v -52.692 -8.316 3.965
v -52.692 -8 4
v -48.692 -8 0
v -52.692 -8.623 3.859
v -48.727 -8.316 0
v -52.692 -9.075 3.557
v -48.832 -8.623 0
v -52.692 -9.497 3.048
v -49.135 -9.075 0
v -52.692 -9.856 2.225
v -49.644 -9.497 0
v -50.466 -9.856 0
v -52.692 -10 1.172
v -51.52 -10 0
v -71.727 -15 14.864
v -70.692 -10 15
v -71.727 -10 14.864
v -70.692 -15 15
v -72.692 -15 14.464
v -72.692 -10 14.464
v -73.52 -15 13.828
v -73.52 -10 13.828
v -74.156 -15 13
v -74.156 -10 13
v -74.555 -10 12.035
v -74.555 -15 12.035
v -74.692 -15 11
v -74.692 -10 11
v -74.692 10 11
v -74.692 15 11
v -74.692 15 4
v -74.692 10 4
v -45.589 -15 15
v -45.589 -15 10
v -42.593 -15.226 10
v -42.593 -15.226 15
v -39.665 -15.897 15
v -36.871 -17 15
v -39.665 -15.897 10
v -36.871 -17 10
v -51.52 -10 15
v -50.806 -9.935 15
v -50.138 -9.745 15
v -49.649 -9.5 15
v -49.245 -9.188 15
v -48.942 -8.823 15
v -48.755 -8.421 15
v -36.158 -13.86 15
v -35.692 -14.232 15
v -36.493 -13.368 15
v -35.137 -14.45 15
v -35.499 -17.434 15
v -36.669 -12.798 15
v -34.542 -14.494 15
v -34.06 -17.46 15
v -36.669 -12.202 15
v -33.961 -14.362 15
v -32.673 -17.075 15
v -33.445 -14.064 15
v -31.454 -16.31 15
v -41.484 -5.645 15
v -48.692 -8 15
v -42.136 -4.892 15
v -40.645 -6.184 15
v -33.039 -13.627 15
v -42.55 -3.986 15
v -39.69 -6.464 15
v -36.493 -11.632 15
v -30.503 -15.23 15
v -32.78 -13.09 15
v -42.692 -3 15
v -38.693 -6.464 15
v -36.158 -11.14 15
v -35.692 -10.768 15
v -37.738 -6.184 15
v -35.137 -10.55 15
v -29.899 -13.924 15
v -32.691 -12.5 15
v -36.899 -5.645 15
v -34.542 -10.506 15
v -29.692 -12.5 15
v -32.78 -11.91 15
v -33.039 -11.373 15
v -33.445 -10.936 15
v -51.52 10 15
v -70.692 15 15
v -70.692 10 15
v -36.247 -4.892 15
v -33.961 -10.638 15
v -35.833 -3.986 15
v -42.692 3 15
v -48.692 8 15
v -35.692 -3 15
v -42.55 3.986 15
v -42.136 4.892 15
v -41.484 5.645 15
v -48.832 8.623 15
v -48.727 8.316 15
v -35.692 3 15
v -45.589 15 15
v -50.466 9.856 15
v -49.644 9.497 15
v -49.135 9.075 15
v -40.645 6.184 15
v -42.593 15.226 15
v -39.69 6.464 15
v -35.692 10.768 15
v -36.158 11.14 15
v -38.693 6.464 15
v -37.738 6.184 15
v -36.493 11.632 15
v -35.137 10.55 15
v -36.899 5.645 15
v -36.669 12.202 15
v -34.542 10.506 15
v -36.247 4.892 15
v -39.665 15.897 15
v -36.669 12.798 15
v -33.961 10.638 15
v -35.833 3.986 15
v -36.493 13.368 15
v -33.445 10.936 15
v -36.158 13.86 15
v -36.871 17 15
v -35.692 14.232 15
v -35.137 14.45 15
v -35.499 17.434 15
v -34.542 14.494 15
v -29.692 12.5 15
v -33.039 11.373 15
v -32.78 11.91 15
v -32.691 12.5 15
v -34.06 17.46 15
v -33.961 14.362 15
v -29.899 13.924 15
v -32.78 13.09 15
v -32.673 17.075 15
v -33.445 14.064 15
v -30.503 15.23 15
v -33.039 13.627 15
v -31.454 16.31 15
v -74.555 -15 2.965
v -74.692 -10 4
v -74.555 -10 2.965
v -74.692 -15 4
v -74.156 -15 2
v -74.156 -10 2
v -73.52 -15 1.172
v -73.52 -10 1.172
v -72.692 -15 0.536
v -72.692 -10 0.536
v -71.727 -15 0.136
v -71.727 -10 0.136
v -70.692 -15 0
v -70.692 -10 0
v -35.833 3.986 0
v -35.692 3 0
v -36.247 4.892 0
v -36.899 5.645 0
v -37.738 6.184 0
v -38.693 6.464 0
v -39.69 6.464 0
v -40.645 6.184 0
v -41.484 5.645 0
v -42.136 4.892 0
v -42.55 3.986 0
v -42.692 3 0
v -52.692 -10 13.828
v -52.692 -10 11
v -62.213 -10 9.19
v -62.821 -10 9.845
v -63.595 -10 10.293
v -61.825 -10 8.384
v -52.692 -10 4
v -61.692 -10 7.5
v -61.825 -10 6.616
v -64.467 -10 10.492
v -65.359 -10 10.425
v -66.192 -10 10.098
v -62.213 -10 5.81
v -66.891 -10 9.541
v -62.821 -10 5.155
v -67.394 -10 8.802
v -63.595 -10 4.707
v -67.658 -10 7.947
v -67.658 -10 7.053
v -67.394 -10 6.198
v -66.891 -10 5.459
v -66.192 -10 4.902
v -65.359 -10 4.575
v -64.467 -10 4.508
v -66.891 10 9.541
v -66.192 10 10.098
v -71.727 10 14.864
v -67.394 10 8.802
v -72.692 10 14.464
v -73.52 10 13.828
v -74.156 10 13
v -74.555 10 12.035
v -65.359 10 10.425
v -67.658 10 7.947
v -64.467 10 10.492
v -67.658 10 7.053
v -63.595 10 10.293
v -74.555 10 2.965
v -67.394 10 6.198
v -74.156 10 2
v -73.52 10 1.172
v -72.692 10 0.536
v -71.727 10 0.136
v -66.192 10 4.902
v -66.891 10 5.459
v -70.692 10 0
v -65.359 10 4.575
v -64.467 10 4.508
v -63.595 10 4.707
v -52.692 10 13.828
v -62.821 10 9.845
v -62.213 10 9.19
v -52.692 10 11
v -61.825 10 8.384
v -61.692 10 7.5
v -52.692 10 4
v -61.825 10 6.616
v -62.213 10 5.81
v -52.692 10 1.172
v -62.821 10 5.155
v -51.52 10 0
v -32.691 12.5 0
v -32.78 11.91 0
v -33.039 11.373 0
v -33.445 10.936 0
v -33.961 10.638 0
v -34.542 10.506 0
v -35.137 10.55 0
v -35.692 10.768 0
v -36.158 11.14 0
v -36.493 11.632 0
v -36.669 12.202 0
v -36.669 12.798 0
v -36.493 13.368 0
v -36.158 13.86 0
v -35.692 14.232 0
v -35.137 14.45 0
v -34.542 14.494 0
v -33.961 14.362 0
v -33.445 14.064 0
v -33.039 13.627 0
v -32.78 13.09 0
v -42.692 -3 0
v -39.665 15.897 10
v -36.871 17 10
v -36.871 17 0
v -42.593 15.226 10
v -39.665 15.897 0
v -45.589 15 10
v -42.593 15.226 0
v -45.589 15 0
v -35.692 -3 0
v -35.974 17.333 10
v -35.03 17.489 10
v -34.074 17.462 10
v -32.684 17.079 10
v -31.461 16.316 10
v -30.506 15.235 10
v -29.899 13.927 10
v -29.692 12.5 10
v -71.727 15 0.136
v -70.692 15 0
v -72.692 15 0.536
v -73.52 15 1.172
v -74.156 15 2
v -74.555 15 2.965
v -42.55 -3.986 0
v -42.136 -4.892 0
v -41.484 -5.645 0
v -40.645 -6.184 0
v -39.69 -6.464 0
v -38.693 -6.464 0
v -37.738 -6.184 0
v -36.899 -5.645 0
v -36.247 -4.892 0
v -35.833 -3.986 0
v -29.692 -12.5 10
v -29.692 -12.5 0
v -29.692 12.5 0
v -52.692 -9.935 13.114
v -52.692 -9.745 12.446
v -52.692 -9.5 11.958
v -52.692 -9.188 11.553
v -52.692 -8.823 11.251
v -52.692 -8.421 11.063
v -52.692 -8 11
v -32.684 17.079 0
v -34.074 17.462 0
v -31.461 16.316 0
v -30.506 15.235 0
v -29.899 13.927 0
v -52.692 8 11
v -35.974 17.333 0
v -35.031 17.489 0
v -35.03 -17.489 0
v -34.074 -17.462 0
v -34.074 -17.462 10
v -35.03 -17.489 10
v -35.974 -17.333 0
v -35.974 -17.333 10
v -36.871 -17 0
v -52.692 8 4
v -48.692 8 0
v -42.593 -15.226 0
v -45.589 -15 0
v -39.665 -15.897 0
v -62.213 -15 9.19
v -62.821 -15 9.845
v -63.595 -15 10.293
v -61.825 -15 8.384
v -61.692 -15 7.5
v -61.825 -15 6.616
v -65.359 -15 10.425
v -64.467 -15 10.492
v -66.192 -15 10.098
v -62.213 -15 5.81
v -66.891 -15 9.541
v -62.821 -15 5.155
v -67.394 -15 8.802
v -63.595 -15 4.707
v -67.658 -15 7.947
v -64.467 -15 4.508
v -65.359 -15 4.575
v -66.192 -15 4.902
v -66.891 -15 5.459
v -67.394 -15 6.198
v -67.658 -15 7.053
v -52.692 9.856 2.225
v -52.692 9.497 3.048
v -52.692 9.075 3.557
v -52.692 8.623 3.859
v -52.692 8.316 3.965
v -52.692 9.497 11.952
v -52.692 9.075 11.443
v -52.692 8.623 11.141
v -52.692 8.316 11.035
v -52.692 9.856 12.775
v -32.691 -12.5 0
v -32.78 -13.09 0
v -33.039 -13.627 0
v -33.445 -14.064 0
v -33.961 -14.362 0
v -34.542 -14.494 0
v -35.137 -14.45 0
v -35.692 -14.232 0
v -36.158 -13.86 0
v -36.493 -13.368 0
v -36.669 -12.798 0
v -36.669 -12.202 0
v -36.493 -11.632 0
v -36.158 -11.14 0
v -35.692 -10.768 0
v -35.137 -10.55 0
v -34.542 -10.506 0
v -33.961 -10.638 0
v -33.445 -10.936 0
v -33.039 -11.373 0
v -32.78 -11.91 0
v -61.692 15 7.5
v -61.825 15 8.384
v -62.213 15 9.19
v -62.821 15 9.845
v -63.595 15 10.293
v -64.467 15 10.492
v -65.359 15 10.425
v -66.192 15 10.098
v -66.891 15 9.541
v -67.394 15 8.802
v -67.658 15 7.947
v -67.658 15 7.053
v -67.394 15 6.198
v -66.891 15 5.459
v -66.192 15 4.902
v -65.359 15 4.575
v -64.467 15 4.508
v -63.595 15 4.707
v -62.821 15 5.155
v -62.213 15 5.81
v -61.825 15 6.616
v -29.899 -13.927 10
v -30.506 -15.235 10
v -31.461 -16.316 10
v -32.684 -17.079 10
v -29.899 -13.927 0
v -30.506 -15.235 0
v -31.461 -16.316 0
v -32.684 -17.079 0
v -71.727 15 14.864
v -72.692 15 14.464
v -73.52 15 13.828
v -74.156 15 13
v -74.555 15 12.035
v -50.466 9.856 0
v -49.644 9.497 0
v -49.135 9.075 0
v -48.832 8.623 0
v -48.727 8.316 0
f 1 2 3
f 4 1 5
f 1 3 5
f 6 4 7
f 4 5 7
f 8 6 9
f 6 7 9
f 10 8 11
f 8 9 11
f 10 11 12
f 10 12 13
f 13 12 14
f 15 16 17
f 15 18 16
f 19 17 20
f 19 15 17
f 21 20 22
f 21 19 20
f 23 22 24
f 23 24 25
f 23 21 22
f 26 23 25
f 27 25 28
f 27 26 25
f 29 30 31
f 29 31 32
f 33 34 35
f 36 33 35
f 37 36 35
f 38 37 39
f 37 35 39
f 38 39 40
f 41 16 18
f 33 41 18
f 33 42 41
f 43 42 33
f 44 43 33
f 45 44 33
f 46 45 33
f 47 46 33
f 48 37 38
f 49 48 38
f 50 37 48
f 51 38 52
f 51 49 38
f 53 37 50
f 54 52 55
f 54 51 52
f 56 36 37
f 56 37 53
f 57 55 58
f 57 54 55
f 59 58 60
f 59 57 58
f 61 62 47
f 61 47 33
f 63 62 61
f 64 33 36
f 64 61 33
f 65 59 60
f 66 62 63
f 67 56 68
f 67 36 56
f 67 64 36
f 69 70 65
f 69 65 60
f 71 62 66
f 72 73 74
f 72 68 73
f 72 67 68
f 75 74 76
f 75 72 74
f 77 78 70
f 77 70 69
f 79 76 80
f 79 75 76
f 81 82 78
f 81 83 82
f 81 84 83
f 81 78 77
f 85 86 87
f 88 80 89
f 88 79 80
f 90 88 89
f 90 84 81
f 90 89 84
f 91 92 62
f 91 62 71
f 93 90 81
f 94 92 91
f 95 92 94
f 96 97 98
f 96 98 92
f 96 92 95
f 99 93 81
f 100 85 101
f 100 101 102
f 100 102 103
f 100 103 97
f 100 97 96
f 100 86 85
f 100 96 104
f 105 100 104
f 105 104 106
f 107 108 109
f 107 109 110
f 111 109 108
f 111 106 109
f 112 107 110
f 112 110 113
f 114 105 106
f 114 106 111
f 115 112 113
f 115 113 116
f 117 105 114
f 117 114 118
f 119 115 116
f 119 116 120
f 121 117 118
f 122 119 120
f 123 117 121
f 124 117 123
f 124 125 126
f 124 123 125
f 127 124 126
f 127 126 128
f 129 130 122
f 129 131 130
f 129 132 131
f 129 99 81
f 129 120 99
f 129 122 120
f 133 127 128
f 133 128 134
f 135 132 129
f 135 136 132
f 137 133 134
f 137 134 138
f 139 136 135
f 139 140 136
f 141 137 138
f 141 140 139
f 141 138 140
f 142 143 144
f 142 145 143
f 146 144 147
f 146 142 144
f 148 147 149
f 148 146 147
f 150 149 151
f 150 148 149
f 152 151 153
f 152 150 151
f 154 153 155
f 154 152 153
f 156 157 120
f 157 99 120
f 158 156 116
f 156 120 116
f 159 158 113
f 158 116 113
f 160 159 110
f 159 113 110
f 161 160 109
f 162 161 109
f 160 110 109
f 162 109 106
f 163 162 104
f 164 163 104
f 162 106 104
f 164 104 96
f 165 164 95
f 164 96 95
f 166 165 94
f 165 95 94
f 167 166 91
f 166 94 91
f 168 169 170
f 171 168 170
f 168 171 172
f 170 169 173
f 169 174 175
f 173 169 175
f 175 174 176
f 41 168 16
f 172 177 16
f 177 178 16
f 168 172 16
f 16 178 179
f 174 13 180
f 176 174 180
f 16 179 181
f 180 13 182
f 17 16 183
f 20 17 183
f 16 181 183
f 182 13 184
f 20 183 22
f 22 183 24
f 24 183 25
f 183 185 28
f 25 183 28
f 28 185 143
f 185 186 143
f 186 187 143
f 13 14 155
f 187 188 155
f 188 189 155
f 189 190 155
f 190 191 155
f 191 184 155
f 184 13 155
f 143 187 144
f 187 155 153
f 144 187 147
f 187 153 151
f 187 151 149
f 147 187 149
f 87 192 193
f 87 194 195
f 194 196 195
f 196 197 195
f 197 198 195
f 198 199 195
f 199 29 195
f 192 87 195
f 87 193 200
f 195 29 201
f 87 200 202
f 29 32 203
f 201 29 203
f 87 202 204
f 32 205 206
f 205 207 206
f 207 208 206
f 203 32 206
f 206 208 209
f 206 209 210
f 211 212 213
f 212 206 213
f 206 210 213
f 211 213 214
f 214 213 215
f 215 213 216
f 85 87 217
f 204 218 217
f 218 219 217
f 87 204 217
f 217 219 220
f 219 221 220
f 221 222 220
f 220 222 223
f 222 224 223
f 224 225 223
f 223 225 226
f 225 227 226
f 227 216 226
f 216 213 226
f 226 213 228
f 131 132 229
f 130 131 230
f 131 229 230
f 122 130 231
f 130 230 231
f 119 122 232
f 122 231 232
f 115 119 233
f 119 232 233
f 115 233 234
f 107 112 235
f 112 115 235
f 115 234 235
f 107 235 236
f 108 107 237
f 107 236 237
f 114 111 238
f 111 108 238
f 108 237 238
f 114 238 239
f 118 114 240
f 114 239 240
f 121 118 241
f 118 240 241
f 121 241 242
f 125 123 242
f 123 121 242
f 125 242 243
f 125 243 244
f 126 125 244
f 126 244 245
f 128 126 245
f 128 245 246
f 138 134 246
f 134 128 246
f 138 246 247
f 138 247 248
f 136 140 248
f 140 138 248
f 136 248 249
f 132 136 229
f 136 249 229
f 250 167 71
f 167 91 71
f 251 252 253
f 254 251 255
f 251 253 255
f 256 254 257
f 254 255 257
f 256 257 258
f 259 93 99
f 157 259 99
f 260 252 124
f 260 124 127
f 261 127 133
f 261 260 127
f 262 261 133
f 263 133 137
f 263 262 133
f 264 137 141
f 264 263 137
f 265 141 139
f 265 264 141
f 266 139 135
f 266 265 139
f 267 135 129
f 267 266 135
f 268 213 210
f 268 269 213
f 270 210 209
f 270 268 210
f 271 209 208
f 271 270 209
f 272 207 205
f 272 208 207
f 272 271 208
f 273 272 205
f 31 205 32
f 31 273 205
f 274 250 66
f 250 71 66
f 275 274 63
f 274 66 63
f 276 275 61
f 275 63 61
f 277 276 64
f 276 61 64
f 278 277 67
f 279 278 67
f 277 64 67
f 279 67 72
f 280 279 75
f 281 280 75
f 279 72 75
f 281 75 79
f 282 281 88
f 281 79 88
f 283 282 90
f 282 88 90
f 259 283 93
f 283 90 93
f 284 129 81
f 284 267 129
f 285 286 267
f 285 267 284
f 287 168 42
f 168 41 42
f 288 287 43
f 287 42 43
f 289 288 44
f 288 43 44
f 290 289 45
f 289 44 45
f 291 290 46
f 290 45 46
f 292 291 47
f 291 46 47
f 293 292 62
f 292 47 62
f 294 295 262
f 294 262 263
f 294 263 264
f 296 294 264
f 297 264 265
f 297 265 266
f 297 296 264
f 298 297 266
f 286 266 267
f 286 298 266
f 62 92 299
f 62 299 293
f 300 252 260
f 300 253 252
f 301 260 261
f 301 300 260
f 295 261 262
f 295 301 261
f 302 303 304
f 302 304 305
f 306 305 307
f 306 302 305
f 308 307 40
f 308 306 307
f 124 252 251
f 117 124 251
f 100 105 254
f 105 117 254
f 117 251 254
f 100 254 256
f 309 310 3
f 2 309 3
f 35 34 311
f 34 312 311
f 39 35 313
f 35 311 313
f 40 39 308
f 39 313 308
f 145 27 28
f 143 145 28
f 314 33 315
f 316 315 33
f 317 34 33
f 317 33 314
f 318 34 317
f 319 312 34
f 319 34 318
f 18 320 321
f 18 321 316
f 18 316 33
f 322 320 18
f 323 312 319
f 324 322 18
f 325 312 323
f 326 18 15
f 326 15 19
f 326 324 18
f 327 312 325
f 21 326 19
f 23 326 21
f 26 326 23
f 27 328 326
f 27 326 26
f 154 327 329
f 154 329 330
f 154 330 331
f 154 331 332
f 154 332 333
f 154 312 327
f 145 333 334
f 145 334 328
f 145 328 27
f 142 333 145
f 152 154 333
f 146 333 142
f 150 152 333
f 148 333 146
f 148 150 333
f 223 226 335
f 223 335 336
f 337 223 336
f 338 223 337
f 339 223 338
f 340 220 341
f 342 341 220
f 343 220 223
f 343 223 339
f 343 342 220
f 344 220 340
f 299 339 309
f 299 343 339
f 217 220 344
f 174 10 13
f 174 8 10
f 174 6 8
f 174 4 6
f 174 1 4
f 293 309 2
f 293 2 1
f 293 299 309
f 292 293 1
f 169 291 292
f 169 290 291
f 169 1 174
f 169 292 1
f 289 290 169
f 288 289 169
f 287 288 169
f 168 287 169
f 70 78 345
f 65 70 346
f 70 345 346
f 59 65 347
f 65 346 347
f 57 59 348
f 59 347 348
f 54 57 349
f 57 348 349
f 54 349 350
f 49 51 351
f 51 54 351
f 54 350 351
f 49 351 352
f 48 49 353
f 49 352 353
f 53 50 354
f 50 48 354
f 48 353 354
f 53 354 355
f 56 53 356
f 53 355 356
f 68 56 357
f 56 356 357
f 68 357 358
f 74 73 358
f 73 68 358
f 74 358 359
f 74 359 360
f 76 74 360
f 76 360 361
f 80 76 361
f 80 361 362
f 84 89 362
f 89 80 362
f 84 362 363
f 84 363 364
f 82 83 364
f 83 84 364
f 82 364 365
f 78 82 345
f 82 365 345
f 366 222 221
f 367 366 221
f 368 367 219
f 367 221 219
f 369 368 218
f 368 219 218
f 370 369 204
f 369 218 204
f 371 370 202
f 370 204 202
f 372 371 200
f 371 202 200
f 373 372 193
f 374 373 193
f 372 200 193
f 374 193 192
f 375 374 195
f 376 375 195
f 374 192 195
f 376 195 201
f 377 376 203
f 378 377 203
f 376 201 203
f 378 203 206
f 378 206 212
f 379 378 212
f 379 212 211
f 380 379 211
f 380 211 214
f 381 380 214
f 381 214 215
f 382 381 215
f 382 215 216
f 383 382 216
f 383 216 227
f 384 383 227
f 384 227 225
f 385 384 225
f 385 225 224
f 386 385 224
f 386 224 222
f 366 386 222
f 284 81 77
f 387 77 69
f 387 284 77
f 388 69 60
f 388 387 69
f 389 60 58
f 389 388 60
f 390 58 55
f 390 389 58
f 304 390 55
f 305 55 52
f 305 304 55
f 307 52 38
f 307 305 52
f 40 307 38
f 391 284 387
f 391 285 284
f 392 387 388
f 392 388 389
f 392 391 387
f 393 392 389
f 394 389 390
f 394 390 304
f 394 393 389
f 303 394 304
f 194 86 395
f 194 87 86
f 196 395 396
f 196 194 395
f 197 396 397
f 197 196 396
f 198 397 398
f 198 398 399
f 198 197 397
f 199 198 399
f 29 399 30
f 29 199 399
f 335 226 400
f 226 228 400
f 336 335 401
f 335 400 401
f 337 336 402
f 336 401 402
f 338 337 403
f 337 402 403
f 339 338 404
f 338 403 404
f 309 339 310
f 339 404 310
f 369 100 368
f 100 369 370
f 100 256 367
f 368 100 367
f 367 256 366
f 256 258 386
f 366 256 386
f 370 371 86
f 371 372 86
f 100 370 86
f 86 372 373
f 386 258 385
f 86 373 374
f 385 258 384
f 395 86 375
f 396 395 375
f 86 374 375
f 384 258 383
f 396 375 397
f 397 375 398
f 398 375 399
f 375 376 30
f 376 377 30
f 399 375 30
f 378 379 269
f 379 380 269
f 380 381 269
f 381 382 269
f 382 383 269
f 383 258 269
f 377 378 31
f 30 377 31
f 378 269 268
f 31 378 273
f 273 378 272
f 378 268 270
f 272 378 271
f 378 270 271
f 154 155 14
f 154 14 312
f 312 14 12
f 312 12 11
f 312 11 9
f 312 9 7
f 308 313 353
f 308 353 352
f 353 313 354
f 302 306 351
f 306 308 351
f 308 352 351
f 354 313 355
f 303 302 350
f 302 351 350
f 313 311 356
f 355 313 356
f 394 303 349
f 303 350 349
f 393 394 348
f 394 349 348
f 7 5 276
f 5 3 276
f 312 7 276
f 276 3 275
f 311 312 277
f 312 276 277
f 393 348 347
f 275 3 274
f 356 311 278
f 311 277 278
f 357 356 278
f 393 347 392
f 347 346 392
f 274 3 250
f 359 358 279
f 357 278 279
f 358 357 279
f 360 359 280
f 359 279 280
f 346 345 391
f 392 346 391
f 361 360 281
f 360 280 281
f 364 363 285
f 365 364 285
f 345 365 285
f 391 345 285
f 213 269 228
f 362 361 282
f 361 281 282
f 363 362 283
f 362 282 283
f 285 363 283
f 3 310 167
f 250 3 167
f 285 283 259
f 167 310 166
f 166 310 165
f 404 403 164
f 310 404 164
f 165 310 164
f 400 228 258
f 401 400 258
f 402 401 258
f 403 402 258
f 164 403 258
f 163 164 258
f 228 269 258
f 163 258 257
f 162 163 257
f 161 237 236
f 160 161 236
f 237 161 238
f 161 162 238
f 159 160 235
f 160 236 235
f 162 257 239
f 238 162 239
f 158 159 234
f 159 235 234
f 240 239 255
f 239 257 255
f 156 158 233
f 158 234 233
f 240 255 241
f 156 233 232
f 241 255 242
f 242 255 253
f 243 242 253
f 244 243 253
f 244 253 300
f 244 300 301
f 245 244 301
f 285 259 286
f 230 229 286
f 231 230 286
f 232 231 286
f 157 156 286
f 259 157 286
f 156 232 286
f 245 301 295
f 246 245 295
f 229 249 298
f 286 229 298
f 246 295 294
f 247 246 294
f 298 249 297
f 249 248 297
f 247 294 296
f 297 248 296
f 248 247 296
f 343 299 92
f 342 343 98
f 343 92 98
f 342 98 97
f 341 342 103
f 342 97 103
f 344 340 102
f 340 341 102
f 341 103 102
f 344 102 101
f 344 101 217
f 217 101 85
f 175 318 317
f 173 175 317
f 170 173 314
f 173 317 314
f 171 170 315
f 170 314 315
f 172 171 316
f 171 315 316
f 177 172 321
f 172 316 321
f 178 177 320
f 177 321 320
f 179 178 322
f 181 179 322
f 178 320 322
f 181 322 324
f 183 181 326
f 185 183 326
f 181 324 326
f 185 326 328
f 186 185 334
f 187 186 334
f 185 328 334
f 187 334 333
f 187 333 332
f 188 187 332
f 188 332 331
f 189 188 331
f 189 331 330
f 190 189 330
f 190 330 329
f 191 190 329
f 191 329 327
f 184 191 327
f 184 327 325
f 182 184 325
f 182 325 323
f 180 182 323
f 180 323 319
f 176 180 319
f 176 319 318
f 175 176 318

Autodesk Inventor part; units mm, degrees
ref_plane "YZ Plane" through (0, 0, 0) normal (1, 0, 0) x (0, 1, 0)
ref_plane "XZ Plane" through (0, 0, 0) normal (0, 1, 0) x (-1, 0, 0)
ref_plane "XY Plane" through (0, 0, 0) normal (0, 0, 1) x (1, 0, 0)
sketch "Sketch1" plane through (0, 0, 0) normal (0, 0, 1) x (1, 0, 0)
  circle A0 centre (19.8085, -5.5) radius 1 projected
  circle A1 centre (30.8085, -5.5) radius 1 projected
  circle A2 centre (19.8085, 5.5) radius 1 projected
  circle A3 centre (30.8085, 5.5) radius 1 projected
  circle A4 centre (25.3085, 0) radius 6.65 projected
  line L0 (41.3085, 2) -> (41.3085, -2) projected
  line L1 (35.1065, 2) -> (41.3085, 2) projected
  arc A5 (35.1065, 2) -> (26.5426, 9.9236) centre (25.3085, 0) ccw projected
  line L2 (26.5426, 9.9236) -> (-34.0744, 17.4618) projected
  arc A6 (-34.0744, 17.4618) -> (-39.6915, 12.5) centre (-34.6915, 12.5) ccw projected
  line L3 (-39.6915, 12.5) -> (-39.6915, -12.5) projected
  arc A7 (-39.6915, -12.5) -> (-34.0744, -17.4618) centre (-34.6915, -12.5) ccw projected
  line L4 (-34.0744, -17.4618) -> (26.5426, -9.9236) projected
  arc A8 (26.5426, -9.9236) -> (35.1065, -2) centre (25.3085, 0) ccw projected
  line L5 (41.3085, -2) -> (35.1065, -2) projected
  circle A9 centre (-34.6915, 12.5) radius 2 projected
  circle A10 centre (-34.6915, -12.5) radius 2 projected
  line L6 (-25.1979, 6.2809) -> (9.3489, 1.9847) projected
  arc A11 (9.3489, -1.9847) -> (9.3489, 1.9847) centre (9.1021, 0) ccw projected
  line L7 (9.3489, -1.9847) -> (-25.1979, -6.2809) projected
  arc A12 (-29.6915, -2.3115) -> (-25.1979, -6.2809) centre (-25.6915, -2.3115) ccw projected
  line L8 (-29.6915, -2.3115) -> (-29.6915, 2.3115) projected
  arc A13 (-25.1979, 6.2809) -> (-29.6915, 2.3115) centre (-25.6915, 2.3115) ccw projected
  circle A14 centre (-34.6915, -12.5) radius 5
  circle A15 centre (-34.6915, 12.5) radius 5
  line L9 (-34.6915, -12.5) -> (-34.6915, 12.5)
  line L10 (-34.6915, -12.5) -> (-29.6915, -12.5)
  line L11 (-34.6915, 12.5) -> (-29.6915, 12.5)
  line L12 (-29.6915, 12.5) -> (-29.6915, -12.5)
  line L13 (-34.6915, 0) -> (-64.6915, 0)
  line L14 (-64.6915, -10) -> (-64.6915, 10)
  line L15 (-64.6915, 10) -> (-34.6915, 10)
  line L16 (-34.6915, 10) -> (-34.6915, -10)
  line L17 (-34.6915, -10) -> (-64.6915, -10)
  line L18 (-64.6915, -10) -> (-34.6915, 10) construction
  line L19 (-64.6915, 10) -> (-34.6915, -10) construction
  line L20 (-64.6915, -10) -> (-34.6915, -10)
  line L21 (-34.6915, -10) -> (-34.6915, -15)
  line L22 (-34.6915, -15) -> (-64.6915, -15)
  line L23 (-64.6915, -15) -> (-64.6915, -10)
  line L24 (-64.6915, 10) -> (-34.6915, 10)
  line L25 (-34.6915, 10) -> (-34.6915, 15)
  line L26 (-34.6915, 15) -> (-64.6915, 15)
  line L27 (-64.6915, 15) -> (-64.6915, 10)
  point P0 (0, 0)
  point P1 (-49.6915, 0)
  point P2 (-39.0216, 15)
  point P3 (-39.6915, 10)
  point P4 (-39.6915, -10)
  point P5 (-39.0216, -15)
  dimension "d0" = 10
  dimension "d1" = 10
  dimension "d2" = 30
  dimension "d3" = 20
  dimension "d4" = 30
  dimension "d5" = 30
  dimension "d6" = 5
  dimension "d7" = 30
  dimension "d8" = 5
extrude "Extrusion1" add sketch "Sketch1" along normal blind 10 contours A15 L11 A9 L25 L26 A6 | A7 L22 L21 A10 L10 A14 | L26 L25 A9 L9 L15 A15 A6 | A6 L3 L15 L27 L26 | L12 L8 A14 L9 A15 | A15 L9 A9 L11 | L22 L23 L17 L3 A7 | A7 A14 L17 L9 A10 L21 L22 | L10 A10 L9 A14 | A15 L15 L3 | L9 L13 L3 L15 A15 | A15 L15 L9 | L3 L17 A14 | L9 L17 A14 | A14 L17 L3 L13 L9
thicken "Thicken1" operation add thickness 10 both sides no extend neighbours yes toward (-1, 0, 0) faces at (-64.6915, -11.6667, 3.3333)
thicken "Thicken2" operation add thickness 10 both sides no extend neighbours yes toward (-1, 0, 0) faces at (-64.6915, 13.3333, 3.3333)
sketch "Sketch2" plane through (0, 0, 10) normal (0, 0, 1) x (1, 0, 0)
  line L0 (-39.6915, 10) -> (-39.6915, -10) projected
  line L1 (-39.6915, -10) -> (-74.6915, -10) projected
  line L2 (-74.6915, -10) -> (-74.6915, -15) projected
  line L3 (-74.6915, -15) -> (-39.0216, -15) projected
  arc A0 (-39.0216, -15) -> (-29.6915, -12.5) centre (-34.6915, -12.5) ccw projected
  line L4 (-29.6915, -12.5) -> (-29.6915, 12.5) projected
  arc A1 (-29.6915, 12.5) -> (-39.0216, 15) centre (-34.6915, 12.5) ccw projected
  line L5 (-39.0216, 15) -> (-74.6915, 15) projected
  line L6 (-74.6915, 15) -> (-74.6915, 10) projected
  line L7 (-74.6915, 10) -> (-39.6915, 10) projected
  circle A2 centre (-34.6915, -12.5) radius 2 projected
  circle A3 centre (-34.6915, 12.5) radius 2 projected
  point P0 (0, 0)
extrude "Extrusion2" add sketch "Sketch2" along normal blind 5
sketch "Sketch3" plane through (0, 0, 15) normal (0, 0, 1) x (1, 0, 0)
  line L0 (-39.6915, 10) -> (-39.6915, -10) projected
  line L1 (-39.6915, -10) -> (-74.6915, -10) projected
  line L2 (-74.6915, -10) -> (-74.6915, -15) projected
  line L3 (-74.6915, -15) -> (-39.0216, -15) projected
  arc A0 (-39.0216, -15) -> (-29.6915, -12.5) centre (-34.6915, -12.5) ccw projected
  line L4 (-29.6915, -12.5) -> (-29.6915, 12.5) projected
  arc A1 (-29.6915, 12.5) -> (-39.0216, 15) centre (-34.6915, 12.5) ccw projected
  line L5 (-39.0216, 15) -> (-74.6915, 15) projected
  line L6 (-74.6915, 15) -> (-74.6915, 10) projected
  line L7 (-74.6915, 10) -> (-39.6915, 10) projected
  circle A2 centre (-34.6915, -12.5) radius 2 projected
  circle A3 centre (-34.6915, 12.5) radius 2 projected
  line L8 (-39.6915, 10) -> (-39.6915, -10) projected
  line L9 (-39.6915, 10) -> (-52.6915, 10)
  line L10 (-52.6915, 10) -> (-52.6915, -10)
  line L11 (-52.6915, -10) -> (-39.6915, -10)
  line L12 (-39.6915, -10) -> (-39.6915, 10)
  point P0 (0, 0)
  dimension "d17" = 13
  dimension "d18" = 20
extrude "Extrusion3" add sketch "Sketch3" against normal up to surface (15 mm away) contours L0 L1 L10 L7
chamfer "Chamfer1" distance 4 angle 45 2 edges at (-52.6915, 0, 0) (-52.6915, 0, 15)
fillet "Fillet1" radius 20 2 edges at (-39.0216, -15, 7.5) (-39.0216, 15, 7.5)
sketch "Sketch4" plane through (0, 0, 15) normal (0, 0, 1) x (1, 0, 0)
  line L0 (-48.6915, -10) -> (-74.6915, -10) projected
  line L1 (-74.6915, -10) -> (-74.6915, -15) projected
  line L2 (-74.6915, -15) -> (-45.5887, -15) projected
  arc A0 (-36.8709, -17) -> (-45.5887, -15) centre (-45.5887, -35) ccw projected
  arc A1 (-36.8709, -17) -> (-29.6915, -12.5) centre (-34.6915, -12.5) ccw projected
  line L3 (-29.6915, -12.5) -> (-29.6915, 12.5) projected
  arc A2 (-29.6915, 12.5) -> (-36.8709, 17) centre (-34.6915, 12.5) ccw projected
  arc A3 (-45.5887, 15) -> (-36.8709, 17) centre (-45.5887, 35) ccw projected
  line L4 (-45.5887, 15) -> (-74.6915, 15) projected
  line L5 (-74.6915, 15) -> (-74.6915, 10) projected
  line L6 (-74.6915, 10) -> (-48.6915, 10) projected
  line L7 (-48.6915, -10) -> (-48.6915, 10) projected
  circle A4 centre (-34.6915, -12.5) radius 2 projected
  circle A5 centre (-34.6915, 12.5) radius 2 projected
  circle A6 centre (-34.6915, -12.5) radius 2 projected
  line L8 (-34.6915, 12.5) -> (-34.6915, -12.5)
  line L9 (-34.6915, 0) -> (-39.1915, 0)
  line L10 (-39.1915, 3) -> (-39.1915, -3) construction
  line L11 (-42.6915, 3) -> (-42.6915, -3)
  line L12 (-35.6915, -3) -> (-35.6915, 3)
  arc A7 (-35.6915, 3) -> (-42.6915, 3) centre (-39.1915, 3) ccw
  arc A8 (-42.6915, -3) -> (-35.6915, -3) centre (-39.1915, -3) ccw
  point P0 (0, 0)
  dimension "d25" = 4.5
  dimension "d26" = 3
  dimension "d27" = 7
extrude "Extrusion4" cut sketch "Sketch4" against normal blind 20 contours A7 L12 A8 L11
sketch "Sketch5" plane through (-74.6915, -15, 0) normal (0, -1, 0) x (1, 0, 0)
  line L0 (29.1028, 15) -> (29.1028, 0) projected
  line L1 (0, 15) -> (29.1028, 15) projected
  line L2 (0, 0) -> (0, 15) projected
  line L3 (0, 0) -> (29.1028, 0) projected
  line L4 (0, 0) -> (0, 15) projected
  line L5 (0, 7.5) -> (10, 7.5)
  circle A0 centre (10, 7.5) radius 3
  point P0 (74.6915, 0)
  dimension "d30" = 10
  dimension "d31" = 6
extrude "Extrusion5" cut sketch "Sketch5" against normal blind 30 contours A0
fillet "Fillet2" radius 2 4 edges at (-50.6915, 10, 13) (-50.6915, -10, 13) (-50.6915, -10, 2) (-50.6915, 10, 2)
fillet "Fillet3" radius 4 4 edges at (-74.6915, -12.5, 0) (-74.6915, -12.5, 15) (-74.6915, 12.5, 0) (-74.6915, 12.5, 15)
properties part number "2020_fixer_1"
